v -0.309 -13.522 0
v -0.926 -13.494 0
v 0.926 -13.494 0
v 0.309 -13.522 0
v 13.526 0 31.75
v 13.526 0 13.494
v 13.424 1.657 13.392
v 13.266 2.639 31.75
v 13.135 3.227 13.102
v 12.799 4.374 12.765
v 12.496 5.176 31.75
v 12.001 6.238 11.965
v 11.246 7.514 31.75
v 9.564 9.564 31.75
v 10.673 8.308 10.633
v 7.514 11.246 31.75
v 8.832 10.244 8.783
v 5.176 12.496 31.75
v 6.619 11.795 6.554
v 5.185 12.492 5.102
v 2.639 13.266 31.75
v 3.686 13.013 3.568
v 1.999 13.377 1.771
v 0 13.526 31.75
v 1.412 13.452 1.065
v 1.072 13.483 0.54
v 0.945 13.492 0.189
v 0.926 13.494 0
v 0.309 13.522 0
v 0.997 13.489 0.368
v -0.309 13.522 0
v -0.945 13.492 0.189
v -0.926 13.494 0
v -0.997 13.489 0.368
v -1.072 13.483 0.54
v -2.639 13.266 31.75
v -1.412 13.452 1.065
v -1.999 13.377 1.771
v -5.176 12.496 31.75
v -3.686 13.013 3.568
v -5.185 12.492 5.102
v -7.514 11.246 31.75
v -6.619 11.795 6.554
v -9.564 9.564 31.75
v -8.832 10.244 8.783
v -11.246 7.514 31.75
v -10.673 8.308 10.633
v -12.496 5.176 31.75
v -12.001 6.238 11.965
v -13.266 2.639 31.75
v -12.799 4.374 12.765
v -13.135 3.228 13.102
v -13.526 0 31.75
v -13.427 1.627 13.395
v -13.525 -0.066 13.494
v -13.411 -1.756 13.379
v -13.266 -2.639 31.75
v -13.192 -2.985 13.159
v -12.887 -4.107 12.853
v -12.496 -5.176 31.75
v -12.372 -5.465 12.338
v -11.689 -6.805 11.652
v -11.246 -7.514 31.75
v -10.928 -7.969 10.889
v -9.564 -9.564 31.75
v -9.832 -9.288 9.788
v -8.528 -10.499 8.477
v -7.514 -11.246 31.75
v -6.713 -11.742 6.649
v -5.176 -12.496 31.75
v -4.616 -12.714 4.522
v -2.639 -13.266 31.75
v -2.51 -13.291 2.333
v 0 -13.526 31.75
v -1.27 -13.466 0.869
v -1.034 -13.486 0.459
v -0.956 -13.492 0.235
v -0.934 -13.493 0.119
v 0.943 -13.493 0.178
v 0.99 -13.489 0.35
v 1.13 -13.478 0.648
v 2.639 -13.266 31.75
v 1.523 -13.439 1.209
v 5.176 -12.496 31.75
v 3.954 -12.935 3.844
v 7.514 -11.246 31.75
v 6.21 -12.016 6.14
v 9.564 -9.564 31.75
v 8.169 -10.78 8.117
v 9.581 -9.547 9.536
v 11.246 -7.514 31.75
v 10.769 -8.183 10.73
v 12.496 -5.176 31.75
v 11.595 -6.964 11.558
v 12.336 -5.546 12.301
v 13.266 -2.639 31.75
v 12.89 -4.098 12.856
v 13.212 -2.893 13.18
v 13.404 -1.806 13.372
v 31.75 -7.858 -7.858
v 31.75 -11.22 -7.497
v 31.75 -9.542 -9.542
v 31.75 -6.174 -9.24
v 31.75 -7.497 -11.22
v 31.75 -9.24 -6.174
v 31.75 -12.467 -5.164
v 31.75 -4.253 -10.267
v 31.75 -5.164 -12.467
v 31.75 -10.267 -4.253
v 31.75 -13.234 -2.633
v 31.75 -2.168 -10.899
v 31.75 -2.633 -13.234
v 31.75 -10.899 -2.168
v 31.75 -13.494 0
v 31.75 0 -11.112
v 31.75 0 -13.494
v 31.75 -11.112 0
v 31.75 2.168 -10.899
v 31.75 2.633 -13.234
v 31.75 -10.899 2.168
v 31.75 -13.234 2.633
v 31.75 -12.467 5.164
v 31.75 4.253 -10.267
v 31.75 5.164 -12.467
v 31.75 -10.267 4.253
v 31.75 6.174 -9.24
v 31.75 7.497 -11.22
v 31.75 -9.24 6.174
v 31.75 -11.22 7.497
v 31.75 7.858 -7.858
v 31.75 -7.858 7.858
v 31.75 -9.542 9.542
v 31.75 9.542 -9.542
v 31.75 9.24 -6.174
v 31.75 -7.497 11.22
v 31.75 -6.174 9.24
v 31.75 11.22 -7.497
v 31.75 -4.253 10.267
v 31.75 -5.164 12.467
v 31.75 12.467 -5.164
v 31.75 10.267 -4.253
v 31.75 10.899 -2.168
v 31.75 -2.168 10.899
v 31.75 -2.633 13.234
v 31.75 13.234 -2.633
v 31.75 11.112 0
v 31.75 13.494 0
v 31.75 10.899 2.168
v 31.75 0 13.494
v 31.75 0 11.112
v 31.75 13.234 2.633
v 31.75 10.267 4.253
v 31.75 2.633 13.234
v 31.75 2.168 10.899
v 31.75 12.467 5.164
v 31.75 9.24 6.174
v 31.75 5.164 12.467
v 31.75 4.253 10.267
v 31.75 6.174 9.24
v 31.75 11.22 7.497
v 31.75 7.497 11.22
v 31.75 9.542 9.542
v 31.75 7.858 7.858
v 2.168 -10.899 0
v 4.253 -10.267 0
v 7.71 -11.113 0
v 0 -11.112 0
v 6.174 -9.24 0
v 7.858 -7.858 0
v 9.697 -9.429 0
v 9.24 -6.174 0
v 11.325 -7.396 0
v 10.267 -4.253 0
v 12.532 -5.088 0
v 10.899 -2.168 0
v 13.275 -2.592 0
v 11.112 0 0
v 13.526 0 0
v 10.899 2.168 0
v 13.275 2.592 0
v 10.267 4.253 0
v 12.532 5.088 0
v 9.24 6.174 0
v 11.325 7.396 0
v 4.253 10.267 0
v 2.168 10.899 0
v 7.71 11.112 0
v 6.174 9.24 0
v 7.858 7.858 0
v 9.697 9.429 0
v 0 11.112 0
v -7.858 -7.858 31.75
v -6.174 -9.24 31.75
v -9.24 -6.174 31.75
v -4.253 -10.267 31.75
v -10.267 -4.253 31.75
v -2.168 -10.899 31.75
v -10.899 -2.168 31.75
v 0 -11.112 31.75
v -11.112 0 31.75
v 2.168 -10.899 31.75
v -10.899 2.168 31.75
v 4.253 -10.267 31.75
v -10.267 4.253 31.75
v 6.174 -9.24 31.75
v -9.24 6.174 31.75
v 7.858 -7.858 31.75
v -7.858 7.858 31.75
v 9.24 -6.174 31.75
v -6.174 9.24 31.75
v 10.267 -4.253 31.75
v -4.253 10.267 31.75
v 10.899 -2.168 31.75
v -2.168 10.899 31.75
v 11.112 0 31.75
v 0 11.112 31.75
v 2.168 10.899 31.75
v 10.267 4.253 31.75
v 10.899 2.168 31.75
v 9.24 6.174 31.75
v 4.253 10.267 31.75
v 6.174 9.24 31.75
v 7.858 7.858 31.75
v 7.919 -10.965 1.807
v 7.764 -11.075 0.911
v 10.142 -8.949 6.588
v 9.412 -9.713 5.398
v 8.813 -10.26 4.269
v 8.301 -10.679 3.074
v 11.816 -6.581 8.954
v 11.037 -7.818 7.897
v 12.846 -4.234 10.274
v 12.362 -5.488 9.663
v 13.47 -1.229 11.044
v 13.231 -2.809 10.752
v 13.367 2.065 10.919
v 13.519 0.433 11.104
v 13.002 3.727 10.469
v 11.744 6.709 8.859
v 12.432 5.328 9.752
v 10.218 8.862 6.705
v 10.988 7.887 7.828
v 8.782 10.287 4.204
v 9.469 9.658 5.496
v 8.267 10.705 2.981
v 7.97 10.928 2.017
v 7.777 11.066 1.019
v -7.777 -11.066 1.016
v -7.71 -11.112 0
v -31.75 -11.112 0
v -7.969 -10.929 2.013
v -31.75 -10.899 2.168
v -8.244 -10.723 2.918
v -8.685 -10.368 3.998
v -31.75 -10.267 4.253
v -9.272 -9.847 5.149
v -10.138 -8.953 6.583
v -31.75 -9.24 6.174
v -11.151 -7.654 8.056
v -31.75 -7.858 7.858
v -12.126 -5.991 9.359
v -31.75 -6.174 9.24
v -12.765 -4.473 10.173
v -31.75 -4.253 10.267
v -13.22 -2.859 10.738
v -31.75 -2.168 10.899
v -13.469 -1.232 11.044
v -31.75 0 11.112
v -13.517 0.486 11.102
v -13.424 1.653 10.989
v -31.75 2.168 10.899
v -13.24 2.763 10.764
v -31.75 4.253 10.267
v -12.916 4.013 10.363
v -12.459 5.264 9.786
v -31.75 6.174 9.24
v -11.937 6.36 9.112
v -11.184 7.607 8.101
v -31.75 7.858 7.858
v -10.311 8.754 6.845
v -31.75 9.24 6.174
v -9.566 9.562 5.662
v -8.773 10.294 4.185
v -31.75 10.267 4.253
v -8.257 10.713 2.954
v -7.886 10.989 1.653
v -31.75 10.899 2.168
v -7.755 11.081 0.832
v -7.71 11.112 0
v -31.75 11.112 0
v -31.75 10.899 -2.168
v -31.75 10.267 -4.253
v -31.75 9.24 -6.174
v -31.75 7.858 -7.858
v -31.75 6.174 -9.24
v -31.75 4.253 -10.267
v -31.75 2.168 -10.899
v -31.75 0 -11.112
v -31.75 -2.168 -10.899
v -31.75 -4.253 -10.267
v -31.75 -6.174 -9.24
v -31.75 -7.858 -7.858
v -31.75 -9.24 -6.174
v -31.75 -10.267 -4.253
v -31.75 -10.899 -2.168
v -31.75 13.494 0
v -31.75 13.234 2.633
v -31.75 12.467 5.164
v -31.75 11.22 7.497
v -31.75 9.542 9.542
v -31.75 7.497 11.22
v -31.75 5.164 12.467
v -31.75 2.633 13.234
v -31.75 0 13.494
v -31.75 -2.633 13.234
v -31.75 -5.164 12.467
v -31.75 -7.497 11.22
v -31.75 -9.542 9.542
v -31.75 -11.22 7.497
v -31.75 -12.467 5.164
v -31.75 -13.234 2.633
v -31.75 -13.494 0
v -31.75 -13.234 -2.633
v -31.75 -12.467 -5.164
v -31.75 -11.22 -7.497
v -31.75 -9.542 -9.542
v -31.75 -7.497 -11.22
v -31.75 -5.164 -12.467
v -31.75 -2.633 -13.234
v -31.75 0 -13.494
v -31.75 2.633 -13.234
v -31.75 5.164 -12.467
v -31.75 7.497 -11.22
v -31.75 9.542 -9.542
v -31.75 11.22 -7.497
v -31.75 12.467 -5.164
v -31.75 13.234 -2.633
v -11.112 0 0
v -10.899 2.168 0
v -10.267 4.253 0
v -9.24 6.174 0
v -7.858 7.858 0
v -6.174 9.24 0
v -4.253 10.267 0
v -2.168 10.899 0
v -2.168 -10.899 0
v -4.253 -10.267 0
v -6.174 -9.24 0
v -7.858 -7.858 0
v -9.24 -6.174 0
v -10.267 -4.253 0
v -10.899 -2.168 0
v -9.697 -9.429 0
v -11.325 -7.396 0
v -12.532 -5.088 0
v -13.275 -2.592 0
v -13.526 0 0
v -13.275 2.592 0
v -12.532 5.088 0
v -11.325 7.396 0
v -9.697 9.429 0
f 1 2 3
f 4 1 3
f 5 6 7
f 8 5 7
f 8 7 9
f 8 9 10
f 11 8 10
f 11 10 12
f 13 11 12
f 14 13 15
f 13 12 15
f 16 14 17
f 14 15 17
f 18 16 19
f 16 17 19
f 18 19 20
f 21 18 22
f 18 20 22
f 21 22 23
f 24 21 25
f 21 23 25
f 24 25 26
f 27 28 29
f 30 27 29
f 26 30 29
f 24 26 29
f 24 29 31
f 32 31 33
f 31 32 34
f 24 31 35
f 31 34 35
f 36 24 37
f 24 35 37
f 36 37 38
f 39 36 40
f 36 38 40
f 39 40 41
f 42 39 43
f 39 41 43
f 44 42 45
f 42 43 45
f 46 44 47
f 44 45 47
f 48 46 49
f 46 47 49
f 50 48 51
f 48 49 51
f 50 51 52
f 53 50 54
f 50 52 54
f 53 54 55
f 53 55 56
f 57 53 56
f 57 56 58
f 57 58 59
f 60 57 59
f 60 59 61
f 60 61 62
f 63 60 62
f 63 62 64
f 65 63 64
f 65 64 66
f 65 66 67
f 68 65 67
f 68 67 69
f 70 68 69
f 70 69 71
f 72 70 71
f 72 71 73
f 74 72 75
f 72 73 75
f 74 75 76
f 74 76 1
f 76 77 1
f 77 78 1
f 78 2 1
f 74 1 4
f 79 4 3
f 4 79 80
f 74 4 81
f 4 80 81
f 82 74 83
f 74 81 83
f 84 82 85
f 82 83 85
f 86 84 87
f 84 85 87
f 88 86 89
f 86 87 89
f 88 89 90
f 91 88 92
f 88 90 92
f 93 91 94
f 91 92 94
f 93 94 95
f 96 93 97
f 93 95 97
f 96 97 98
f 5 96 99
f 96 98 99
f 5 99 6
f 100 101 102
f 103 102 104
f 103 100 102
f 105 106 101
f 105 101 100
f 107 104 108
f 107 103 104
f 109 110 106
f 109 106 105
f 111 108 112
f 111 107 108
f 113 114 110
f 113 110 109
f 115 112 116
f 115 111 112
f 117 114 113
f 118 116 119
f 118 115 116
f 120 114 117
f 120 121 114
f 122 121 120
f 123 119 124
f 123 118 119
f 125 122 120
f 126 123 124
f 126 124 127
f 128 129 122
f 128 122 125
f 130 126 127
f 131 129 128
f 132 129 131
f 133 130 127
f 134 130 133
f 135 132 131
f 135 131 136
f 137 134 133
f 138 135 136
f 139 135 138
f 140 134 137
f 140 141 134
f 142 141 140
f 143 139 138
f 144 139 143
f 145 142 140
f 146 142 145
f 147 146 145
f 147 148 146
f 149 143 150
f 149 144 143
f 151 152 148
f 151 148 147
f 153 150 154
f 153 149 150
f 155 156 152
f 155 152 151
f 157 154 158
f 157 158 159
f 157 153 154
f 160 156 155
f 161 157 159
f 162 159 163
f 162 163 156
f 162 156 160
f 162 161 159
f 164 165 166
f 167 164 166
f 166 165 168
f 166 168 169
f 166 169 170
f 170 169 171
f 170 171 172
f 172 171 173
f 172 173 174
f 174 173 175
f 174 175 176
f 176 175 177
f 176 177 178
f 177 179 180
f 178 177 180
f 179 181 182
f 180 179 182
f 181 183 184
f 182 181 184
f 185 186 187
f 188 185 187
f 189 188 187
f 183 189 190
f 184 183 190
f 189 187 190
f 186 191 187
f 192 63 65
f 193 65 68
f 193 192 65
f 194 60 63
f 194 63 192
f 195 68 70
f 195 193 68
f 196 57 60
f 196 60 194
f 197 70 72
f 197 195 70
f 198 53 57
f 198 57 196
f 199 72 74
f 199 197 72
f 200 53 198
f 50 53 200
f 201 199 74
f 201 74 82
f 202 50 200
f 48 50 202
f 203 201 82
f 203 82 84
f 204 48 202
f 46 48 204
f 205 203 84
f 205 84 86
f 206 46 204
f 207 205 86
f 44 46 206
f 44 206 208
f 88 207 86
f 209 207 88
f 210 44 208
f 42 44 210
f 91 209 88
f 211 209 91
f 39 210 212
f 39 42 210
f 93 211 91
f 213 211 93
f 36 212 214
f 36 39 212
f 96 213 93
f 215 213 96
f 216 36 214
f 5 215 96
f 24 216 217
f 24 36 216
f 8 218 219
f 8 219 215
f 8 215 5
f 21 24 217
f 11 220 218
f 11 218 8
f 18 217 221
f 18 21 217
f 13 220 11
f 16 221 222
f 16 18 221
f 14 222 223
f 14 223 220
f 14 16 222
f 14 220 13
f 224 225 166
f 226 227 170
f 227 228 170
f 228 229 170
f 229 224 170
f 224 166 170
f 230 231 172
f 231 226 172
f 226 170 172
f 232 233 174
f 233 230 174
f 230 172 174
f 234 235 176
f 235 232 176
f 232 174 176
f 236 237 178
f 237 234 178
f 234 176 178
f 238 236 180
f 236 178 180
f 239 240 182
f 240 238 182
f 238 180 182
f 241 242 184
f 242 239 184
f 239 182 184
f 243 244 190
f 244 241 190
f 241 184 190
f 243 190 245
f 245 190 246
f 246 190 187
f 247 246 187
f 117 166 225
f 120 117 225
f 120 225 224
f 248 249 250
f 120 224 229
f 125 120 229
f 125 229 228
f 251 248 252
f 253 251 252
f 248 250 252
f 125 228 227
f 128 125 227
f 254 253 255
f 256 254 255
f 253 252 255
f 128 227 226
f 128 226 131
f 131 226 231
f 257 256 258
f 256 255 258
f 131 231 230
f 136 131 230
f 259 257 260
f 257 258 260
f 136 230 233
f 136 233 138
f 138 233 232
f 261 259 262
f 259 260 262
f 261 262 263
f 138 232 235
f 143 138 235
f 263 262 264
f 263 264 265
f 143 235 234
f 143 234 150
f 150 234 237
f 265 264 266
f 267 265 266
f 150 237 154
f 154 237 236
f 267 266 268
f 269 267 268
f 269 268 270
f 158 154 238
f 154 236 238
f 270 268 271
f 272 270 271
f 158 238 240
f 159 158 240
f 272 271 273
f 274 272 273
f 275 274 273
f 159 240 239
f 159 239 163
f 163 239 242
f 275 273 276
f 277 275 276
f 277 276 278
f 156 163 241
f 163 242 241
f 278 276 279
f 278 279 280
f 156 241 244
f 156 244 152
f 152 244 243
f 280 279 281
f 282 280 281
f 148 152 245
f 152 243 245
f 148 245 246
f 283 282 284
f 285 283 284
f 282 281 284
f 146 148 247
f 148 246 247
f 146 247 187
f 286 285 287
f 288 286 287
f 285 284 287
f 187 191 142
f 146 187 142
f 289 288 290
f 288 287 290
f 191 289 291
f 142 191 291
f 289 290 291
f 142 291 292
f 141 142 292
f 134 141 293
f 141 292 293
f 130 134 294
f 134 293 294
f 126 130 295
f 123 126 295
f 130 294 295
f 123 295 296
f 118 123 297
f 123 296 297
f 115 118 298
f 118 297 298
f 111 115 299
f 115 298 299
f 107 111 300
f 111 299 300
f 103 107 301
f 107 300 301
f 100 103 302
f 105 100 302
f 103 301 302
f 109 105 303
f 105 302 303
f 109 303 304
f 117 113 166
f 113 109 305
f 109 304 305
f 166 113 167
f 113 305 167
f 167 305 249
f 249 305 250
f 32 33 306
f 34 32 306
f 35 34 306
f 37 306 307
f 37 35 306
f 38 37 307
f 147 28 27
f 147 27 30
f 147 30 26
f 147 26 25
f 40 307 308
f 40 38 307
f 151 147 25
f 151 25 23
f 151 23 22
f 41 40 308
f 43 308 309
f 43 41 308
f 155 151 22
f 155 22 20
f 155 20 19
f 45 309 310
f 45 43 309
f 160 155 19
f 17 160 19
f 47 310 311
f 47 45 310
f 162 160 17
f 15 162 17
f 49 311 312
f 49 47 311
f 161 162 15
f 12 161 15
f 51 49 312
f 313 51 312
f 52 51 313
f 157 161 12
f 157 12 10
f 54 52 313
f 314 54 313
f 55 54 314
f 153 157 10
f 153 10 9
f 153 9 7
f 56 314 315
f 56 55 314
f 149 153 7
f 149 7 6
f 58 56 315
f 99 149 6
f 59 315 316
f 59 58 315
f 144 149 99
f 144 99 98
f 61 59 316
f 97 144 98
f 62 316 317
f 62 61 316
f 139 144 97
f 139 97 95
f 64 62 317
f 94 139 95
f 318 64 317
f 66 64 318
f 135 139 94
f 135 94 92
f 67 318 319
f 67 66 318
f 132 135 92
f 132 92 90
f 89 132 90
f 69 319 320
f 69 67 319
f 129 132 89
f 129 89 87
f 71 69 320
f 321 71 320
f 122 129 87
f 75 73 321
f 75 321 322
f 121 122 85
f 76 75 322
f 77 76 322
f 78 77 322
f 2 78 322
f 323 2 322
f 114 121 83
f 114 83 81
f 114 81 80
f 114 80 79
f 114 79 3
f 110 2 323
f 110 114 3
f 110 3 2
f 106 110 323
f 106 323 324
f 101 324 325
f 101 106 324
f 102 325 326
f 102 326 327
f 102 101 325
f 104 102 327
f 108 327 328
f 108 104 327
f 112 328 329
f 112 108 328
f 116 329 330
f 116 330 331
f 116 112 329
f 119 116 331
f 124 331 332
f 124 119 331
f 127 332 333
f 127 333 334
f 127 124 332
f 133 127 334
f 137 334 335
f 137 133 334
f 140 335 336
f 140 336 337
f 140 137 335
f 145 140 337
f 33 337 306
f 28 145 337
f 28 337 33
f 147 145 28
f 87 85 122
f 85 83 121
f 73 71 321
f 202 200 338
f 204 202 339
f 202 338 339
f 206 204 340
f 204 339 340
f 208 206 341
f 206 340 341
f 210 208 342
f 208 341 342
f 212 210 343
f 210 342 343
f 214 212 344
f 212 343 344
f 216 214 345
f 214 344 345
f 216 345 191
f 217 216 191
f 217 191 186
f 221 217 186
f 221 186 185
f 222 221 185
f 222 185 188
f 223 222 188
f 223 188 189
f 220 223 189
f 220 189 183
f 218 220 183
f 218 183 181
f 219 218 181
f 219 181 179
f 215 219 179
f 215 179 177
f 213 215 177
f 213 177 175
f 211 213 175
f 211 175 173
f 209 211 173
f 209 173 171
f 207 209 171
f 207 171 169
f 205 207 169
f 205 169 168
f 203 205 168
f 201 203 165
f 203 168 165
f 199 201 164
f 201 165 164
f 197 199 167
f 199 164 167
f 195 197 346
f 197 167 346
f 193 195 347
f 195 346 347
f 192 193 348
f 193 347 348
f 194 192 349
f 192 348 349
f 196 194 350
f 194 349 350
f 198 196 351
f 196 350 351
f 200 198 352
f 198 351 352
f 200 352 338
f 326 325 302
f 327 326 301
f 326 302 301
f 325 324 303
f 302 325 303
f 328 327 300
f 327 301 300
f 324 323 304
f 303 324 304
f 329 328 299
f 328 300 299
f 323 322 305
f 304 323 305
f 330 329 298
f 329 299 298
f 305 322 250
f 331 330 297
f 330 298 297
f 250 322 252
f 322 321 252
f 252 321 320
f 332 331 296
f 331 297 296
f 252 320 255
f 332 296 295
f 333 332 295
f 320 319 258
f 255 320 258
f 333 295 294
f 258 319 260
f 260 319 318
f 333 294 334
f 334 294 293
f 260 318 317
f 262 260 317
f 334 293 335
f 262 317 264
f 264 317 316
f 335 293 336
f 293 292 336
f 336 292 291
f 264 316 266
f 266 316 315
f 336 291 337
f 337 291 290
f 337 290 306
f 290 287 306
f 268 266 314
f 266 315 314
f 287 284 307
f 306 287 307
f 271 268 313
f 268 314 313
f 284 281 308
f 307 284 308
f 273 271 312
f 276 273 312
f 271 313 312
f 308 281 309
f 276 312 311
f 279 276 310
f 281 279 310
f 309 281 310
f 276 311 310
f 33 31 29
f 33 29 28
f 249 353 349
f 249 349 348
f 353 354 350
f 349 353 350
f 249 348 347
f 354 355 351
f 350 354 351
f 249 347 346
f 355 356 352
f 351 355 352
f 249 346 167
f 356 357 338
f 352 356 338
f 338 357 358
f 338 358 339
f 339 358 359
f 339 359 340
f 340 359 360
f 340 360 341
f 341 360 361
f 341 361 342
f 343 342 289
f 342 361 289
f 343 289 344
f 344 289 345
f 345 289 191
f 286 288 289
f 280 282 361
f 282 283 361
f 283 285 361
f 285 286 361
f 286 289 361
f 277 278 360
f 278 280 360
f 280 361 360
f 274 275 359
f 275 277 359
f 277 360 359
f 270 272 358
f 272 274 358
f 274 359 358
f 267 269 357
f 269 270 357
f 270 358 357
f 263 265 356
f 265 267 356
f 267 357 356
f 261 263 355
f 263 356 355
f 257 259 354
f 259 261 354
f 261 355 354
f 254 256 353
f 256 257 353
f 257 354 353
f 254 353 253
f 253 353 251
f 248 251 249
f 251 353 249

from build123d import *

# Parameters (mm, degrees)
F0_R     = 13.49375
F1_DEPTH = 31.75
F3_D     = 22.225
F4_R     = 13.5255
F5_DEPTH = 31.75
F7_D     = 22.225
F7_DEPTH = 31.75


with BuildPart() as f1:
    # F0 (on Right) → F1 (new body, symmetric)
    with BuildSketch(Plane.YZ):
        Circle(F0_R)
    extrude(amount=F1_DEPTH, both=True)

    # F3 (through all)
    with Locations(Plane.YZ.offset(31.75)):
        with Locations((0, 0)):
            Hole(F3_D / 2)

    # F4 (on Top) → F5 (join)
    with BuildSketch(Plane.XY):
        Circle(F4_R)
    extrude(amount=F5_DEPTH)

    # F7
    with Locations(Plane.XY.offset(31.75)):
        with Locations((0, 0)):
            Hole(F7_D / 2, depth=F7_DEPTH)


solid = f1.part
